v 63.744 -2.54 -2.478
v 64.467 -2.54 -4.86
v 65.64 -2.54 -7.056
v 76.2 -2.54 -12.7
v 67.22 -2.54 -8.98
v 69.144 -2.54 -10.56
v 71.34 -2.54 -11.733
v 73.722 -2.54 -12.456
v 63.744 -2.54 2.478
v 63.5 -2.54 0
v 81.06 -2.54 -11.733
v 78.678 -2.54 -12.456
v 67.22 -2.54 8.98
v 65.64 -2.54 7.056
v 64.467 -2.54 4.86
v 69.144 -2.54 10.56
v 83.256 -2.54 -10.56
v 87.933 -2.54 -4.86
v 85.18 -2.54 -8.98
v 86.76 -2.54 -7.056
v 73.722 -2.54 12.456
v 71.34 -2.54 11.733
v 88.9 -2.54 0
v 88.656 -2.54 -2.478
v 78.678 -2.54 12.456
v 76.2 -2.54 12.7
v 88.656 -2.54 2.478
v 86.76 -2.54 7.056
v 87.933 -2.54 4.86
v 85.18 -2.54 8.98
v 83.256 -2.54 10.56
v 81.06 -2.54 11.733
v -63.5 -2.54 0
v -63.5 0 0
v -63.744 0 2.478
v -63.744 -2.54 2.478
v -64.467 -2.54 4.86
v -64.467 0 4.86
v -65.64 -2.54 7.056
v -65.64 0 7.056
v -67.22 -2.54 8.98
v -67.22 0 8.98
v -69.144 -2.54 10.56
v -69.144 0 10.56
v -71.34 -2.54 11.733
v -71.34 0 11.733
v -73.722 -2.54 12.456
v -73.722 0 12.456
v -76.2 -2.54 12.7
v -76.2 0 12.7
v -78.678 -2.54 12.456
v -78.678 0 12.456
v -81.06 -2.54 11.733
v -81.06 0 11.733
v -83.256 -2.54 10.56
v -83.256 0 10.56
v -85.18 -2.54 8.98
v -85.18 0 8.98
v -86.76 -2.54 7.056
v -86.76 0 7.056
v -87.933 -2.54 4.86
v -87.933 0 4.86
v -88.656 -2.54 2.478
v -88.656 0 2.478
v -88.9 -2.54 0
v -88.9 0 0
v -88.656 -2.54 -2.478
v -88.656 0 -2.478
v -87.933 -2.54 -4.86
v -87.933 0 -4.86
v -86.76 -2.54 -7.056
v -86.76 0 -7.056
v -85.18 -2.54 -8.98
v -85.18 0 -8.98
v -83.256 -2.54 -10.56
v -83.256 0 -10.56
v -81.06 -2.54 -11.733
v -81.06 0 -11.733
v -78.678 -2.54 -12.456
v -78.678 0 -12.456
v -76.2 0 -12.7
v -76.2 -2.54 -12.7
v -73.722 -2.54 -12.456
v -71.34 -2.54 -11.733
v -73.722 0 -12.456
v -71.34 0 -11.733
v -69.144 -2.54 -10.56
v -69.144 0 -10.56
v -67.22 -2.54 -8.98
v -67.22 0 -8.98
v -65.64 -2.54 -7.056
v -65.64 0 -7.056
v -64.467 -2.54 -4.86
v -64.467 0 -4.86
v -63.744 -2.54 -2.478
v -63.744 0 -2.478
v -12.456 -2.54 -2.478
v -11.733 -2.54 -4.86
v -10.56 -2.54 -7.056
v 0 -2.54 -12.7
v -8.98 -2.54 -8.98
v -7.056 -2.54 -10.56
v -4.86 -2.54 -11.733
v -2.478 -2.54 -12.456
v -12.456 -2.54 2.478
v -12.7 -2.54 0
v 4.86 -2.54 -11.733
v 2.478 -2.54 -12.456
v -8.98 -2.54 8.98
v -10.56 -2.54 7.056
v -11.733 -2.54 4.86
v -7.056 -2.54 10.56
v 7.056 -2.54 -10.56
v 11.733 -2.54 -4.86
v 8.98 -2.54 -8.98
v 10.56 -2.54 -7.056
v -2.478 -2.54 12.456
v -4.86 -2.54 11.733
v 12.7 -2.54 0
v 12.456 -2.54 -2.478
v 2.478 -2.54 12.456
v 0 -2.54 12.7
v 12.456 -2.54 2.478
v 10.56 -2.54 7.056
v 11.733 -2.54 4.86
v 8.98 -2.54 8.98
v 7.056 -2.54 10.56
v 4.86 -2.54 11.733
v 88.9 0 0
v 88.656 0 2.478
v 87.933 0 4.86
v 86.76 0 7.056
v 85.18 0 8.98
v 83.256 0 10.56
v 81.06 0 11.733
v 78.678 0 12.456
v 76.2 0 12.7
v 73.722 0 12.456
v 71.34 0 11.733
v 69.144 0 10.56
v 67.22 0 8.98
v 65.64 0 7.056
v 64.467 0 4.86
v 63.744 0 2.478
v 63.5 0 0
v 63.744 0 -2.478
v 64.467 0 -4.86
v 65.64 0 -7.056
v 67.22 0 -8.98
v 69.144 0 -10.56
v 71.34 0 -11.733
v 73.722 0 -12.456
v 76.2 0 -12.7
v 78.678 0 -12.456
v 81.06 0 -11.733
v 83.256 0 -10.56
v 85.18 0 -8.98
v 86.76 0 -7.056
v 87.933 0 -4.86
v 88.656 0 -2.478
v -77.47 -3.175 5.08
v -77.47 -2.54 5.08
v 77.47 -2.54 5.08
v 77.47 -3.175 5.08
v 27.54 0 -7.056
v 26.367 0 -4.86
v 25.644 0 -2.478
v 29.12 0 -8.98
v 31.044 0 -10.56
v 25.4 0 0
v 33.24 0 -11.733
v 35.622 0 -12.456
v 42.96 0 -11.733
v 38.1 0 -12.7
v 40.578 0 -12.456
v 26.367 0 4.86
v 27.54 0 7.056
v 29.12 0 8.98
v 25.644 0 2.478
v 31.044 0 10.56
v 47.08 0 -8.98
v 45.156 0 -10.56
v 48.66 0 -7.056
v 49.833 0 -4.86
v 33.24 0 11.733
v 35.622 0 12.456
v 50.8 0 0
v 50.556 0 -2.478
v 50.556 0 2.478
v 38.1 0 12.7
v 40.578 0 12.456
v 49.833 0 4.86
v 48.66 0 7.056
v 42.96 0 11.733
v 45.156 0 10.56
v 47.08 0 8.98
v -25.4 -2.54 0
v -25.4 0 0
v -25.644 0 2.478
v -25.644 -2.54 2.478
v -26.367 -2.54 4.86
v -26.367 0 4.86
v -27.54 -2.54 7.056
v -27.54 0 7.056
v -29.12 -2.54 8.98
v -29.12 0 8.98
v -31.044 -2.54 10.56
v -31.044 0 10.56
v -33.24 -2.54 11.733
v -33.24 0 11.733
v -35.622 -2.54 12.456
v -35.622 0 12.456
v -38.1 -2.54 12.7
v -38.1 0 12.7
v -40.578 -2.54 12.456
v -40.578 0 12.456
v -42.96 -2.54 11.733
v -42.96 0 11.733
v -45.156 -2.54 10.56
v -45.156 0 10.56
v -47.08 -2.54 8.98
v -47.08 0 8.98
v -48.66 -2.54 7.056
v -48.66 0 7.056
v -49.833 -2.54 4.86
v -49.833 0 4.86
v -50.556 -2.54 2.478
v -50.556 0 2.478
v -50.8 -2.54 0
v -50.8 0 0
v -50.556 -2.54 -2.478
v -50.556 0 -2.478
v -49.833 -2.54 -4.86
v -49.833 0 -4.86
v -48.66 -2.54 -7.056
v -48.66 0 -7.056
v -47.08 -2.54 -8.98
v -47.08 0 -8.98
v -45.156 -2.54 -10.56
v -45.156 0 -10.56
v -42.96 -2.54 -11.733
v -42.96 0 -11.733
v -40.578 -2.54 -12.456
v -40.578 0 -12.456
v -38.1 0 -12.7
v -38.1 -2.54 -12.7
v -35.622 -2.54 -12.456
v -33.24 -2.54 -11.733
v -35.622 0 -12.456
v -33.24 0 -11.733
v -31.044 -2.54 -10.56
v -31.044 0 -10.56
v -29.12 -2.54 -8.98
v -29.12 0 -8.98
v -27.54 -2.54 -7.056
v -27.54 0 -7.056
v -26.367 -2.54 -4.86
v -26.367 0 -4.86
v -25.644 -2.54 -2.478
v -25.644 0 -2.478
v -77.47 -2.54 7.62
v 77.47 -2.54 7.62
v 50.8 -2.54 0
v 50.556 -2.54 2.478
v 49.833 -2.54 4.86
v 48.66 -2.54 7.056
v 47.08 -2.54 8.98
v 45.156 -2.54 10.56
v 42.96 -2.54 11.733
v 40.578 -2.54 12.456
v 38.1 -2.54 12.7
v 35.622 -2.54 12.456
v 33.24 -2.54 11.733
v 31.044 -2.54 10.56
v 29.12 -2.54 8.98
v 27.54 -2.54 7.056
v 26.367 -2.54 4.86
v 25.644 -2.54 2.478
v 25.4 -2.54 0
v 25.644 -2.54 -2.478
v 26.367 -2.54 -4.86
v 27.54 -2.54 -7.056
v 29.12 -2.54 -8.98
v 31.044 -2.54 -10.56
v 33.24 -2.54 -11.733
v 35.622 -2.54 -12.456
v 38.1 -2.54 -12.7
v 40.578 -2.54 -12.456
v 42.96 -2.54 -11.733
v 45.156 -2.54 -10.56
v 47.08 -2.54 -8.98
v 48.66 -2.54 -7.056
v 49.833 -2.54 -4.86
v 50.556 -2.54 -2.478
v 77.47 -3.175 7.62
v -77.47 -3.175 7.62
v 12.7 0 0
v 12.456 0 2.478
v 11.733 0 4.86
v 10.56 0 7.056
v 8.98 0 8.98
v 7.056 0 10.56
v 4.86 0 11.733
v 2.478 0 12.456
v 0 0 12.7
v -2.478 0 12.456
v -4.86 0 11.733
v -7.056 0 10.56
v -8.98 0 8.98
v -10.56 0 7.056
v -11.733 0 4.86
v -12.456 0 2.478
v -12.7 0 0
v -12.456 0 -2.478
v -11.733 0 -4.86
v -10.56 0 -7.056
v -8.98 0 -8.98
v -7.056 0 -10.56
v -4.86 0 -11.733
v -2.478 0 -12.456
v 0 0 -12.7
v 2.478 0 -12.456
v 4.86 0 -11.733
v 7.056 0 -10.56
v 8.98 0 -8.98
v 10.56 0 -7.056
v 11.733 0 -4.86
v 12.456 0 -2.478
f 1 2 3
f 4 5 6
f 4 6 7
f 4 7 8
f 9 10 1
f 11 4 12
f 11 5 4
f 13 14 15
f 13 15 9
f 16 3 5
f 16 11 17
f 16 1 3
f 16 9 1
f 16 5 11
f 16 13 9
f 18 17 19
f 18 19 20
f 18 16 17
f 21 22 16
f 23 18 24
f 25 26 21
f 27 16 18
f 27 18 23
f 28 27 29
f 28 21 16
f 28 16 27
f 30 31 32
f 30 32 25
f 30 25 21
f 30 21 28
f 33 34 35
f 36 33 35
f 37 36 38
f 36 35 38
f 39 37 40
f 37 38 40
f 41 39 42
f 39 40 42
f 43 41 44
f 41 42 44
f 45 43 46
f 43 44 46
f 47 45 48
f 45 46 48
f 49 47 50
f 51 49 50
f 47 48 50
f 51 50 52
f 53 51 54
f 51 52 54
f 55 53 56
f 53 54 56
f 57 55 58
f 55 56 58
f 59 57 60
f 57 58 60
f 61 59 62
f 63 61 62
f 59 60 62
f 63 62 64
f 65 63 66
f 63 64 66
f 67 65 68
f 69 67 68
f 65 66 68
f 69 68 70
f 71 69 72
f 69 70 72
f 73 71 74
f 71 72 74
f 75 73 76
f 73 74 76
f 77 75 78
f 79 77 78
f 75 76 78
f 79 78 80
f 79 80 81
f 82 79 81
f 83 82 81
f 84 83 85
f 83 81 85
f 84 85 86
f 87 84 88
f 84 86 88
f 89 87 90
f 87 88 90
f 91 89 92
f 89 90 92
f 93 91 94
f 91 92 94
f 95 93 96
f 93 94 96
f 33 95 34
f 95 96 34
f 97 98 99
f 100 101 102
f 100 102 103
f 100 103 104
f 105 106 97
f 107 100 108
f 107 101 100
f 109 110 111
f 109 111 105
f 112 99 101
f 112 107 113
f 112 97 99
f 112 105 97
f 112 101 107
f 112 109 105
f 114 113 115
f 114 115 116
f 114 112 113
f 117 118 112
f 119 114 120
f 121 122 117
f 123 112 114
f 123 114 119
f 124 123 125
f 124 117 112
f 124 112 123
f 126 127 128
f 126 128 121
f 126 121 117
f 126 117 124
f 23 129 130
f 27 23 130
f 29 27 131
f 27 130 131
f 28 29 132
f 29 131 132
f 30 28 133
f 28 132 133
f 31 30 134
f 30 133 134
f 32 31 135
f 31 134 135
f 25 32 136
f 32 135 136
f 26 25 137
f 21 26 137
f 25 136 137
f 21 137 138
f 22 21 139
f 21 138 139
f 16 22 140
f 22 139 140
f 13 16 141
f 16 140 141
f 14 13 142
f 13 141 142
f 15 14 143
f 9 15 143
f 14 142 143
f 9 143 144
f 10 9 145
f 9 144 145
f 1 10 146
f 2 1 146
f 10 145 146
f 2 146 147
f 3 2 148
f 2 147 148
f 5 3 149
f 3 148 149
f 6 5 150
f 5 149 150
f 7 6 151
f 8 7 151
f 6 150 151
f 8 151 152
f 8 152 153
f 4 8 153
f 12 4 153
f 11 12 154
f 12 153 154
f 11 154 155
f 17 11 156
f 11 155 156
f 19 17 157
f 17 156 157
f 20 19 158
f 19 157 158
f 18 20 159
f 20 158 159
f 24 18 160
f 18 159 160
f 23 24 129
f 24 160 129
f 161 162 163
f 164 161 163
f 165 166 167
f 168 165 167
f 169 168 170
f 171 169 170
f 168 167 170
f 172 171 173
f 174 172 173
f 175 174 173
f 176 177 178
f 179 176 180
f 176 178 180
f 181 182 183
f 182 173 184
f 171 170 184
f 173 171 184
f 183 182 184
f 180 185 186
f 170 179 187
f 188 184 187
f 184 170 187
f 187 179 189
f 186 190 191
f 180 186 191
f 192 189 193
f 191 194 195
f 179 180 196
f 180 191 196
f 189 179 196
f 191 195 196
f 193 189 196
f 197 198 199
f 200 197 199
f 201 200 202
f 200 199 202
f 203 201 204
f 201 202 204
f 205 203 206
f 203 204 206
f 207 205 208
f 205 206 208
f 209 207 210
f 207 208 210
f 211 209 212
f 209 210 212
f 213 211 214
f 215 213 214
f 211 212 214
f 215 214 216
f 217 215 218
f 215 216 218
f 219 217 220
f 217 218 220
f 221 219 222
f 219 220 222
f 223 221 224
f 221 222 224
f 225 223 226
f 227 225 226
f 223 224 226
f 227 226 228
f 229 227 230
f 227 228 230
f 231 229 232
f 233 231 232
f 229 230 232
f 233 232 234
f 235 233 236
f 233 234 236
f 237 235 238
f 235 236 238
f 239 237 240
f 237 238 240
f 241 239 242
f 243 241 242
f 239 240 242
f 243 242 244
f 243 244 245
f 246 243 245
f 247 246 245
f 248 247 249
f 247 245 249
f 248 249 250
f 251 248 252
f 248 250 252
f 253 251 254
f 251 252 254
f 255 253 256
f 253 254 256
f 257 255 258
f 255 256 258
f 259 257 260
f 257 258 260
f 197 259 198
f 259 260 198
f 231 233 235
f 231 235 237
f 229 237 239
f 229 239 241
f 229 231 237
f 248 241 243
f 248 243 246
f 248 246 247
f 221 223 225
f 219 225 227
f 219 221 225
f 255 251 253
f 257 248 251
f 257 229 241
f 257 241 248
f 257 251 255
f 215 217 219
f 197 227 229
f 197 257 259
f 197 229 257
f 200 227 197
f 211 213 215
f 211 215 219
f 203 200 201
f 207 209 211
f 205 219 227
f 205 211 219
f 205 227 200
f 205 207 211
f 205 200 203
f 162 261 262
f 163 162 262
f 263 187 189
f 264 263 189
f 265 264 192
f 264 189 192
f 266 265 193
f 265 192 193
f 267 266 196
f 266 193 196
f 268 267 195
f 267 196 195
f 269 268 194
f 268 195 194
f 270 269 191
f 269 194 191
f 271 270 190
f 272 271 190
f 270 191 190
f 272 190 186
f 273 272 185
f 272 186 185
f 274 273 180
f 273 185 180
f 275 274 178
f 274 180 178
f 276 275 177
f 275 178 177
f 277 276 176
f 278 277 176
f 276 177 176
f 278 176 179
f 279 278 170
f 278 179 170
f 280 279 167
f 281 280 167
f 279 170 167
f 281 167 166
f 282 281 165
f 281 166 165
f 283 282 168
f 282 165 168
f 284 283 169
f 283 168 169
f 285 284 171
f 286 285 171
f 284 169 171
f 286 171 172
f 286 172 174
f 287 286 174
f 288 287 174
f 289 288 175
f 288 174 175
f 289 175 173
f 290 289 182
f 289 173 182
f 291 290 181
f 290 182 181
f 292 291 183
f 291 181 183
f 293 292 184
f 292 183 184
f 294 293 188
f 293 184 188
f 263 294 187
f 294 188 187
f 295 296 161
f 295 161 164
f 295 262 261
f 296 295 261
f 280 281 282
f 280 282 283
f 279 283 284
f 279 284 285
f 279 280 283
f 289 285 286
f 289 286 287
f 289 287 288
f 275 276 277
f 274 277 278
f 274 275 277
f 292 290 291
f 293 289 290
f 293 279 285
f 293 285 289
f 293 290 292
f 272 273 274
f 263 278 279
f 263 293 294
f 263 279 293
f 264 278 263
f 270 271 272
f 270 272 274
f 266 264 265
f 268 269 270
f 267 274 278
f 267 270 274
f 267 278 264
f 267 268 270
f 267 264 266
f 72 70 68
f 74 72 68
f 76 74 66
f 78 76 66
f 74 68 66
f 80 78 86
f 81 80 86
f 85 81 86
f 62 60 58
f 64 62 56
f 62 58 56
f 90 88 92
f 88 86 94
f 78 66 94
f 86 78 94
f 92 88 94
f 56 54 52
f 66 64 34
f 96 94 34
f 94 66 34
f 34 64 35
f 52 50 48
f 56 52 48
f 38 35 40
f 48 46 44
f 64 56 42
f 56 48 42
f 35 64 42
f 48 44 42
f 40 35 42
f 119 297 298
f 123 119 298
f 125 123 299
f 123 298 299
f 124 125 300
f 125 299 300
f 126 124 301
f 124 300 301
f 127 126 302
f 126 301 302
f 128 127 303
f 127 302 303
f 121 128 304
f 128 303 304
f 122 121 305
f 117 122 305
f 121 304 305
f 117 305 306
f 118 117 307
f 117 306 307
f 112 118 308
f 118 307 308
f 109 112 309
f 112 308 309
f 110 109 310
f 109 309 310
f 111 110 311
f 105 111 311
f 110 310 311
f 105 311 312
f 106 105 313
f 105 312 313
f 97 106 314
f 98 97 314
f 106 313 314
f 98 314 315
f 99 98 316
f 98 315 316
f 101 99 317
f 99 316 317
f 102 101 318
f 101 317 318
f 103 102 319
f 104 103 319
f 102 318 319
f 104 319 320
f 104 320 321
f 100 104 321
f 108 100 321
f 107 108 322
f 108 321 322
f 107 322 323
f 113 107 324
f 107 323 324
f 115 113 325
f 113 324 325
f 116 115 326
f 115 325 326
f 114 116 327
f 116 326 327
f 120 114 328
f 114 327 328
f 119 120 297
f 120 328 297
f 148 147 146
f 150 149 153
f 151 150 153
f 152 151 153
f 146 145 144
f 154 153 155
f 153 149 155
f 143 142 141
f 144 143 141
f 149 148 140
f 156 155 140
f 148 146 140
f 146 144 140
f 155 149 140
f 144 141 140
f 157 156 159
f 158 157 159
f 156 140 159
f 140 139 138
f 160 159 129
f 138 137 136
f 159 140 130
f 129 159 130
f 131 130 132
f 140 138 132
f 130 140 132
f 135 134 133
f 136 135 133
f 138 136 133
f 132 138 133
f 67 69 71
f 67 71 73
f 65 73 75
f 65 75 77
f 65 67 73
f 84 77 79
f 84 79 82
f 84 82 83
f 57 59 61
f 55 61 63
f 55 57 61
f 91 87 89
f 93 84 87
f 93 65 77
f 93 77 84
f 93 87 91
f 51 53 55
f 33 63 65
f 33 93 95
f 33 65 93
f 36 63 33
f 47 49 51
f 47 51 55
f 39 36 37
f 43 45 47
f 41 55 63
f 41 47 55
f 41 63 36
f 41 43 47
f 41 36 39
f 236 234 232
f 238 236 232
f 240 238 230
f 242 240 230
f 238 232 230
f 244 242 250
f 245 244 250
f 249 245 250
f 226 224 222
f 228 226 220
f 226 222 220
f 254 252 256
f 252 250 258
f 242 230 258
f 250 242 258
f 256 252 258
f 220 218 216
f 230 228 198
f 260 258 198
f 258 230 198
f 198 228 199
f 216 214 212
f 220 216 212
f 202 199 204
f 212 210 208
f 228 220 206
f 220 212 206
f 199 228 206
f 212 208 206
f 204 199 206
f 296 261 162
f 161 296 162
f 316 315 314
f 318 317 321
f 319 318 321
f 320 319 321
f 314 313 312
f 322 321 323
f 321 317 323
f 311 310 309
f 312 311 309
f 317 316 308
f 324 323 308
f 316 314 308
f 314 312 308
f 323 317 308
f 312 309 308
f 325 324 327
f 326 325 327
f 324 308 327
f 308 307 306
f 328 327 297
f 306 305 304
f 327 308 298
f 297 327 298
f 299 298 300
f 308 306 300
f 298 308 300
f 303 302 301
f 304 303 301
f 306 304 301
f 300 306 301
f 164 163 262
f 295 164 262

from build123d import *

# Parameters (mm, degrees)
F0_R     = 12.7
F1_DEPTH = 2.54
F3_DEPTH = 0.635


with BuildPart() as f1:
    # F0 (on Front) → F1 (new body)
    with BuildSketch(Plane.XZ):
        with Locations((-76.2, 0)):
            Circle(F0_R)
        with Locations((-38.1, 0)):
            Circle(F0_R)
        Circle(F0_R)
        with Locations((38.1, 0)):
            Circle(F0_R)
        with Locations((76.2, 0)):
            Circle(F0_R)
    extrude(amount=F1_DEPTH)


with BuildPart() as f3:
    # F2 (on face) → F3 (new body)
    with BuildSketch(Plane.XZ.offset(2.54)):
        with BuildLine():
            Line((-48.26, 7.62), (-66.04, 7.62))
            ThreePointArc((-66.04, 7.62), (-65.226391, 6.392958), (-64.560258, 5.08))
            Line((-64.560258, 5.08), (-49.739742, 5.08))
            Line((-49.739742, 5.08), (-26.460258, 5.08))
            Line((-26.460258, 5.08), (-11.639742, 5.08))
            Line((-11.639742, 5.08), (11.639742, 5.08))
            Line((11.639742, 5.08), (26.460258, 5.08))
            Line((26.460258, 5.08), (49.739742, 5.08))
            Line((49.739742, 5.08), (64.560258, 5.08))
            Line((64.560258, 5.08), (77.47, 5.08))
            Line((77.47, 5.08), (77.47, 7.62))
            Line((77.47, 7.62), (66.04, 7.62))
            Line((66.04, 7.62), (48.26, 7.62))
            Line((48.26, 7.62), (27.94, 7.62))
            Line((27.94, 7.62), (10.16, 7.62))
            Line((10.16, 7.62), (-10.16, 7.62))
            Line((-10.16, 7.62), (-27.94, 7.62))
            Line((-27.94, 7.62), (-48.26, 7.62))
        make_face()
        with BuildLine():
            ThreePointArc((-64.560258, 5.08), (-65.226391, 6.392958), (-66.04, 7.62))
            Line((-66.04, 7.62), (-77.47, 7.62))
            Line((-77.47, 7.62), (-77.47, 5.08))
            Line((-77.47, 5.08), (-64.560258, 5.08))
        make_face()
    extrude(amount=F3_DEPTH)


solid = Compound([f1.part, f3.part])
